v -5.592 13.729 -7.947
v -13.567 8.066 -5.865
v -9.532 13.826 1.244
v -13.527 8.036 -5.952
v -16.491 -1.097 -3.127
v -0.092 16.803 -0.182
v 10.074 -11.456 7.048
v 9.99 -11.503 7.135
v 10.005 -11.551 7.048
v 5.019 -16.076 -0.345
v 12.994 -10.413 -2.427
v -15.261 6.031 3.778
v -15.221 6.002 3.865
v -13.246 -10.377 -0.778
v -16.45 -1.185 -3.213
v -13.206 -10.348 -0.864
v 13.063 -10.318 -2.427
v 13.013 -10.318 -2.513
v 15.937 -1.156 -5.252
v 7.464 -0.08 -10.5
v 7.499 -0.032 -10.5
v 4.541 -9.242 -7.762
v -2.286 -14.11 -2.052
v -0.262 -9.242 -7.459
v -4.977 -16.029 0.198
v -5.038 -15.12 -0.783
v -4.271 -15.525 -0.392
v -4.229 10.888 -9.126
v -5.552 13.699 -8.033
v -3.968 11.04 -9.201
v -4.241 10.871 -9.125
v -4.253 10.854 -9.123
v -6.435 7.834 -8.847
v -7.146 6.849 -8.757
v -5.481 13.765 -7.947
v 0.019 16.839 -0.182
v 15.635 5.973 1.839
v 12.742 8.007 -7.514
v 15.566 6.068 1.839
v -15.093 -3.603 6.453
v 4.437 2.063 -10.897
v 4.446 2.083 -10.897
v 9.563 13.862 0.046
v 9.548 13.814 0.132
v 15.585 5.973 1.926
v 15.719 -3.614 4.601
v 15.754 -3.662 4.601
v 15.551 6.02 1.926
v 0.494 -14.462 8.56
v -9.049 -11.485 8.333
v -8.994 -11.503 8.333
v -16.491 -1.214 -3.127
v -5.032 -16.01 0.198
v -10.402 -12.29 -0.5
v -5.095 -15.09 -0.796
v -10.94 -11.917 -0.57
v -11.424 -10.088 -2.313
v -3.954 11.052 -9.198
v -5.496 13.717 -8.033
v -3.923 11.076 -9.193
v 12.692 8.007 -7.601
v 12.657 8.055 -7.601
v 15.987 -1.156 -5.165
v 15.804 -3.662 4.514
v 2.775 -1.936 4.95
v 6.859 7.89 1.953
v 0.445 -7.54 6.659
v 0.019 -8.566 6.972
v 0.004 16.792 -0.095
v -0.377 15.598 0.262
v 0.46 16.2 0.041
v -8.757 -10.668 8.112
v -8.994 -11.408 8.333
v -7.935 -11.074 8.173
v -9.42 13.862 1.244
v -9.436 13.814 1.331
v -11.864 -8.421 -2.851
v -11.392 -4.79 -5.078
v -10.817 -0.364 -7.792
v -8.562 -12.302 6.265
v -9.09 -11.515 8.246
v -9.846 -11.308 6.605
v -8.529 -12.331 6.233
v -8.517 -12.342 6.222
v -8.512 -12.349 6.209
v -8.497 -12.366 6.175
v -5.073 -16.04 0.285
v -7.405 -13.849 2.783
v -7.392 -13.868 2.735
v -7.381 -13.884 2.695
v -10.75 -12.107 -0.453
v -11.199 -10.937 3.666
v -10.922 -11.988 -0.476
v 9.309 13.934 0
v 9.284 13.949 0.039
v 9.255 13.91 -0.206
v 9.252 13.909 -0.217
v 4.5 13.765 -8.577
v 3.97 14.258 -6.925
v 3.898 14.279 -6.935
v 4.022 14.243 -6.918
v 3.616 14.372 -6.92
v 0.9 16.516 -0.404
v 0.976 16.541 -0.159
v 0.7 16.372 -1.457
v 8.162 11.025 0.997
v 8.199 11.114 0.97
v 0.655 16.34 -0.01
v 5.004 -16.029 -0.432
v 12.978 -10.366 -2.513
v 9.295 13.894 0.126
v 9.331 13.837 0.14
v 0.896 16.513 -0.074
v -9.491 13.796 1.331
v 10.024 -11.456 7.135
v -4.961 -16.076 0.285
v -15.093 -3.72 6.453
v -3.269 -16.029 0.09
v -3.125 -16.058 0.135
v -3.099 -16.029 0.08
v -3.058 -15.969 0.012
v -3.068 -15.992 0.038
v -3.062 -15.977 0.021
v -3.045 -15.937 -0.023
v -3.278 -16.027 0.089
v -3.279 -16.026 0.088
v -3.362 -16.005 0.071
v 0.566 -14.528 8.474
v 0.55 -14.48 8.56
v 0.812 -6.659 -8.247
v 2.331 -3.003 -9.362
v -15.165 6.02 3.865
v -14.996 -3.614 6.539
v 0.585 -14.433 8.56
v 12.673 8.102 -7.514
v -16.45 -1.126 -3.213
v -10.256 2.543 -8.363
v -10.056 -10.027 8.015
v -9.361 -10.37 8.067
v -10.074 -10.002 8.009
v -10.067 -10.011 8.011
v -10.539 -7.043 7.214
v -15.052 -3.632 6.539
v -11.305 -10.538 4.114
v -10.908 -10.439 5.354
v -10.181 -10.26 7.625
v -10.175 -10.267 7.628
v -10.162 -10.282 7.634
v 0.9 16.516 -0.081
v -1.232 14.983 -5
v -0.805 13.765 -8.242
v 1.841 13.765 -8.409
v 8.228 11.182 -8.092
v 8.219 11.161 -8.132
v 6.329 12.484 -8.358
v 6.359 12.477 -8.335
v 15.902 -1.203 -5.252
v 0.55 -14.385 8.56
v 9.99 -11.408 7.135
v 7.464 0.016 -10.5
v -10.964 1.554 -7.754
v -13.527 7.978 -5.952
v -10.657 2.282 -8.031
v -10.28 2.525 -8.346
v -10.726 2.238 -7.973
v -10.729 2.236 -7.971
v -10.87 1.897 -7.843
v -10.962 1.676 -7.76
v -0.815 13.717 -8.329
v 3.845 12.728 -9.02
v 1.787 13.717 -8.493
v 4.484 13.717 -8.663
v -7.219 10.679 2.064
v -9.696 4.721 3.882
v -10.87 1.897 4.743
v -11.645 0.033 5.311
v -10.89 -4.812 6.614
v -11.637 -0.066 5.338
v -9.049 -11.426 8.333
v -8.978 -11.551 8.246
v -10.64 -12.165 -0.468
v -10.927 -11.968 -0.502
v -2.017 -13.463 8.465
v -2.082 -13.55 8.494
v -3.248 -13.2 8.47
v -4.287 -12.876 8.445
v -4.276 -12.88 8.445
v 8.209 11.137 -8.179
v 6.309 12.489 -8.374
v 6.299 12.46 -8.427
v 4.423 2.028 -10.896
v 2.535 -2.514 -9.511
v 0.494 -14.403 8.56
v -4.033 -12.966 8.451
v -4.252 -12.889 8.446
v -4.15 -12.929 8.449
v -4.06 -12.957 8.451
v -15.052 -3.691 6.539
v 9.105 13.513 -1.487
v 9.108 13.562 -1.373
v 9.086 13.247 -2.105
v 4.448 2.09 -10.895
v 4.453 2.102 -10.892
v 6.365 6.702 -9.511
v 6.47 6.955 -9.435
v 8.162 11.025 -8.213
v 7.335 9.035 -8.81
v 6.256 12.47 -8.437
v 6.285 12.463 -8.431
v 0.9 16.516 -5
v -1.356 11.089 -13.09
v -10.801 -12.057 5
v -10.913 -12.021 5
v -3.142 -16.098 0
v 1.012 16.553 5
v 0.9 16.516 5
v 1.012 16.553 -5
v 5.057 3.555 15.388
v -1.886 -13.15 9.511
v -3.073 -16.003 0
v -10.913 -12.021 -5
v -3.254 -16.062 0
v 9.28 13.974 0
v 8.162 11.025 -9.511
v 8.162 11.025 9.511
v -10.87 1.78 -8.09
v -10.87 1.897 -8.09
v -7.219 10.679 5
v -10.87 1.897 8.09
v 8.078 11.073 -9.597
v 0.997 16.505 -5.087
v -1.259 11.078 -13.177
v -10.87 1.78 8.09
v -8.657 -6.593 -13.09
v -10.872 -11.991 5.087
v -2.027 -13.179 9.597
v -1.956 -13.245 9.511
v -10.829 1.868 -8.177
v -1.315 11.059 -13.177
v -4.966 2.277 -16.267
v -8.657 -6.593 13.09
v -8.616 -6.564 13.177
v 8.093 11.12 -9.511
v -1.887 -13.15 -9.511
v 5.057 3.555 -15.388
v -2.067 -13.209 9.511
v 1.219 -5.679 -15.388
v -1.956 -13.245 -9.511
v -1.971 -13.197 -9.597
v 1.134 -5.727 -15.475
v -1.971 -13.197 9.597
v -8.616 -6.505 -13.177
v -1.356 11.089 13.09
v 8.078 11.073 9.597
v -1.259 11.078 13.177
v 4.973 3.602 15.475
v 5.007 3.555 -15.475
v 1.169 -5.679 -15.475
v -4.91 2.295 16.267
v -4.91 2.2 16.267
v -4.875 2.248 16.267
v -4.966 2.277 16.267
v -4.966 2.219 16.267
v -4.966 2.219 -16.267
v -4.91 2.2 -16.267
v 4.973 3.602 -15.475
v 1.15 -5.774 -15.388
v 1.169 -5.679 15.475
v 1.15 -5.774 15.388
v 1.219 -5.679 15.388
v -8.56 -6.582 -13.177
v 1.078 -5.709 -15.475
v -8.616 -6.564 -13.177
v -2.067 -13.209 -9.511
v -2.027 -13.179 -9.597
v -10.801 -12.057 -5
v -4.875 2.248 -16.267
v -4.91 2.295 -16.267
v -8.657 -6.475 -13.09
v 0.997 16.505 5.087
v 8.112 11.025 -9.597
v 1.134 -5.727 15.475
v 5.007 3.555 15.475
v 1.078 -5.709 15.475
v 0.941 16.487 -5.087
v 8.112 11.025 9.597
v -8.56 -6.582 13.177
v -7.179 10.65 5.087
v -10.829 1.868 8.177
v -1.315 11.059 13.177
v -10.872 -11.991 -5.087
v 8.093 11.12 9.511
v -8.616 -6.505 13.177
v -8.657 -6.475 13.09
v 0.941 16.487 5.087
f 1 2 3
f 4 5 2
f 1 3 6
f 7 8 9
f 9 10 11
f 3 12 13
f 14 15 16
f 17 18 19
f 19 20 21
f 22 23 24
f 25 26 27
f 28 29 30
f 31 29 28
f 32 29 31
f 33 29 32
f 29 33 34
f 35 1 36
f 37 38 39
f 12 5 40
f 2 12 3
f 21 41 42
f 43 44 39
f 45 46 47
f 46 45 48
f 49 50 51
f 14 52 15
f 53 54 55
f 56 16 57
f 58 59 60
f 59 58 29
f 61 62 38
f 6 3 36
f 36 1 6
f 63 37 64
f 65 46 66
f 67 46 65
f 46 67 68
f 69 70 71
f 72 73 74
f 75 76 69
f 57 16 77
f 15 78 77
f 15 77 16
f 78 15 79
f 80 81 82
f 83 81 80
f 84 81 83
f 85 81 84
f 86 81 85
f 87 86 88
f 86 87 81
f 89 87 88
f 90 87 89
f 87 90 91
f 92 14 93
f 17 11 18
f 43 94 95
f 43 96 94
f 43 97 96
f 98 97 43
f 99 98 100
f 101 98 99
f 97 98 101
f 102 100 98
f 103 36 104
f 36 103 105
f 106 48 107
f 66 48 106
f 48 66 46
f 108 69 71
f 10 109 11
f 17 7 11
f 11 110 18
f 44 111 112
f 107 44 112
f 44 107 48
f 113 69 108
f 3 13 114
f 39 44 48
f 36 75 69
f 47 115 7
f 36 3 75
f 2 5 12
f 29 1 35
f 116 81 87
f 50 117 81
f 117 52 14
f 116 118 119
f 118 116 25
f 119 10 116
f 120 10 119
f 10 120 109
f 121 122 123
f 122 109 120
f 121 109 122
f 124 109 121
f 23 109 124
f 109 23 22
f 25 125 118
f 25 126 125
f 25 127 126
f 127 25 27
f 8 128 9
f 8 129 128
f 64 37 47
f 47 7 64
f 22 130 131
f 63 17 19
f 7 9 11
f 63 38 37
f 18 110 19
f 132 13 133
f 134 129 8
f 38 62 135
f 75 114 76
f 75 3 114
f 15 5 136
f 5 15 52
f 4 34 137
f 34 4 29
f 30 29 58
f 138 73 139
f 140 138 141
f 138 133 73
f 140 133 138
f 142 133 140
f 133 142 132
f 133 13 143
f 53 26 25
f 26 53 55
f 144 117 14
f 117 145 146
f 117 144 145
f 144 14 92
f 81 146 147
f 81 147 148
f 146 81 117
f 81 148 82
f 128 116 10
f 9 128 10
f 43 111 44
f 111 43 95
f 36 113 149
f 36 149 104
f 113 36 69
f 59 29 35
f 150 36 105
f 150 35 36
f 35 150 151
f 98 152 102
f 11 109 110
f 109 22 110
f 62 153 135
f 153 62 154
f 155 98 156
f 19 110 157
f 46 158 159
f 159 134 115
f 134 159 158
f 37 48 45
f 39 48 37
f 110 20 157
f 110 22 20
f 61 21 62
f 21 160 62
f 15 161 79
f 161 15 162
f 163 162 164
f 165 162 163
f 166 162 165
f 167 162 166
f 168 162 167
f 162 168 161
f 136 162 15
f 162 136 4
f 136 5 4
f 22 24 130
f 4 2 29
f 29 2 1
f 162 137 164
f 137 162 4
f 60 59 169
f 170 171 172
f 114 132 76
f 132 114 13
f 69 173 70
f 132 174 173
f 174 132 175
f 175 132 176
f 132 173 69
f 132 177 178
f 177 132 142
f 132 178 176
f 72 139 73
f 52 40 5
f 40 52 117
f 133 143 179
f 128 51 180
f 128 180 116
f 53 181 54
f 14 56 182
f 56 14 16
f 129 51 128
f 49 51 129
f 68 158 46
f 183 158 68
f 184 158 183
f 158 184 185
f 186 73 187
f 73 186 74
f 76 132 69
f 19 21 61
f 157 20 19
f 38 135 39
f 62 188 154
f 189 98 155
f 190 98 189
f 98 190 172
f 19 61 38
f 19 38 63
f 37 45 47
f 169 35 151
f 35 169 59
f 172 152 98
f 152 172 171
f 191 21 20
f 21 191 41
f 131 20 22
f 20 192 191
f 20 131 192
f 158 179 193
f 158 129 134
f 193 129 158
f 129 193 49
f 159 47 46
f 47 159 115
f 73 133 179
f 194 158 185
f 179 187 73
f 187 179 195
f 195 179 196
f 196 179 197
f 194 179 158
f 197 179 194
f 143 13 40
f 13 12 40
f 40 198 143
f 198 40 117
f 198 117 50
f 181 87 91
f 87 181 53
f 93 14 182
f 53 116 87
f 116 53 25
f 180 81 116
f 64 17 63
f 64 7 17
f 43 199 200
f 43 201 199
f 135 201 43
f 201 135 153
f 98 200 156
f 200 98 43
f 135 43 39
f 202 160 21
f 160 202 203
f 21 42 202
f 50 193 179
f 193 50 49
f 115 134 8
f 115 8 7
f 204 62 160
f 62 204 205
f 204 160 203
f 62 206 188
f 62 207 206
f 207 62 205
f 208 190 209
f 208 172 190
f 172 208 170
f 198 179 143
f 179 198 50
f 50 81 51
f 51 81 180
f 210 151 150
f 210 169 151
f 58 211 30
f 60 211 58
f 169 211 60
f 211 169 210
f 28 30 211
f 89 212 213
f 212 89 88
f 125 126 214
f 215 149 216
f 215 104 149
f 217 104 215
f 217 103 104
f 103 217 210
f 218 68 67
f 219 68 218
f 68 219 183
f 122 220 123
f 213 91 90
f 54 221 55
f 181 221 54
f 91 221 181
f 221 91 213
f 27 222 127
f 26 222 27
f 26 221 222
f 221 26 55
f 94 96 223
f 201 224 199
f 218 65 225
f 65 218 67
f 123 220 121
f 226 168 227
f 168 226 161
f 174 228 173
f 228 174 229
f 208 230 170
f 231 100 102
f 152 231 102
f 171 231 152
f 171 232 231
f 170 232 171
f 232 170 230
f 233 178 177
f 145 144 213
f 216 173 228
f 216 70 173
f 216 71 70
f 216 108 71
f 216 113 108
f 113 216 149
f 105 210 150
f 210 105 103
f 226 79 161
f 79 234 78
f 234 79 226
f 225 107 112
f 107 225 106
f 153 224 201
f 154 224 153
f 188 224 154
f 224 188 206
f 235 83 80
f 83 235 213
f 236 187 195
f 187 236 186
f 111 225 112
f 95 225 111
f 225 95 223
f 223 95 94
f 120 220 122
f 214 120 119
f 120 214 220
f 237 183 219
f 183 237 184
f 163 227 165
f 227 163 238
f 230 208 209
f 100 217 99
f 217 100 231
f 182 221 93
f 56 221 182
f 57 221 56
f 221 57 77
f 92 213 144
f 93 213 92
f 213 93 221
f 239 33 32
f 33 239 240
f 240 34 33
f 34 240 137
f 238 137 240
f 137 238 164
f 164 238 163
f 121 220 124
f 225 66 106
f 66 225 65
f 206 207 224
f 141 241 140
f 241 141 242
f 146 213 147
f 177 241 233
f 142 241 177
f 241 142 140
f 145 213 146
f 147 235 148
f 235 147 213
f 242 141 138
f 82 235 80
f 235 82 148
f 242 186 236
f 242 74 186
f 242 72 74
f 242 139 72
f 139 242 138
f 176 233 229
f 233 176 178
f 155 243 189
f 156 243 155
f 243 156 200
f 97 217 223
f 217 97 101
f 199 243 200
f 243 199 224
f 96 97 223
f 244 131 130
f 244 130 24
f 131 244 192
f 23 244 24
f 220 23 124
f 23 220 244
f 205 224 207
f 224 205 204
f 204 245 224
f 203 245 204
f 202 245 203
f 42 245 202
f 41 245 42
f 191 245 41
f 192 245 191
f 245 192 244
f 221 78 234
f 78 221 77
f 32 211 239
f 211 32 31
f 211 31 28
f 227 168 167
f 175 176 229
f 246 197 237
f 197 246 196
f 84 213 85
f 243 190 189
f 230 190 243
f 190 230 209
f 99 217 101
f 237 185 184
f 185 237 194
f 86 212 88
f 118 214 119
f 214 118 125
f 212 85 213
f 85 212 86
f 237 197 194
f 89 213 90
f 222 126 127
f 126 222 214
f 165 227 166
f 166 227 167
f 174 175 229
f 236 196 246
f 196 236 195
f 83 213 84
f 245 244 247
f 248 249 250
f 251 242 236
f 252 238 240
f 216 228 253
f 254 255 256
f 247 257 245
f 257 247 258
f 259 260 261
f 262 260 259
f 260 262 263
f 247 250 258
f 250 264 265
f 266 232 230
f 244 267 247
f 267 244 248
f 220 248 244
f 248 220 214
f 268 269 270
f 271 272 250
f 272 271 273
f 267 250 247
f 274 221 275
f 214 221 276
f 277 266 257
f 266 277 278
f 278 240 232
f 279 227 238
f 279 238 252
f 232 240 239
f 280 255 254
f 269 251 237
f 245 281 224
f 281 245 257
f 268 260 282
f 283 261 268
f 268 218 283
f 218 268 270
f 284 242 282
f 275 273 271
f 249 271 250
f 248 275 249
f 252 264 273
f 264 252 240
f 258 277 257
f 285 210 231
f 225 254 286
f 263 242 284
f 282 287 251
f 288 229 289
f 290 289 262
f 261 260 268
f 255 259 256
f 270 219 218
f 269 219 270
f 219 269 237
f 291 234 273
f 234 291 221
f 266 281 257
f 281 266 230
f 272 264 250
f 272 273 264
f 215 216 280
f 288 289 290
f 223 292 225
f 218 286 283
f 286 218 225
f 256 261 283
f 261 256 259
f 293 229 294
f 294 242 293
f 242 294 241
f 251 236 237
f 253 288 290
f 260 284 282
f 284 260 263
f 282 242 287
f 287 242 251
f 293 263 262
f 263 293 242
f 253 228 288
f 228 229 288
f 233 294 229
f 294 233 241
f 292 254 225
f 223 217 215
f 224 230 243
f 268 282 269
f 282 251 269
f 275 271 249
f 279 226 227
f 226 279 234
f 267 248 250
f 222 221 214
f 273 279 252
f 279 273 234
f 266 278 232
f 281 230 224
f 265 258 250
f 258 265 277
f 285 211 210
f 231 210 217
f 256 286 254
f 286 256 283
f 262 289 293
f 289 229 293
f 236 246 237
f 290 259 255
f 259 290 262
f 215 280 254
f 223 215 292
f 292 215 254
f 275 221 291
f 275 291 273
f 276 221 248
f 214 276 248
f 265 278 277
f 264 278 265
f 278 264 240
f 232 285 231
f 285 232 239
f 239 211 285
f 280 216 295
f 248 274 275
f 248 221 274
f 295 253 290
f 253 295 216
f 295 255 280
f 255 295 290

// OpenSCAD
// Auto-generated OpenSCAD file

    inner_points = 10*[[0.0981256772482181, 1.6457575604228036, -0.49999971188637654], [-1.0832035552174737, -1.1961778079047776, 0.5000005689987711], [-0.1274890829740991, 1.102996499198401, -1.309016652616536], [0.09812663002150081, 1.6457572632118638, 0.5000002881131254], [-1.0832045079907566, -1.1961775106938377, -0.49999943100073085], [-0.8575887949951567, -0.6534167466803746, 1.3090175097289307], [-0.4925404806041831, 0.22479035715641538, -1.618033560192892], [-0.127486588581261, 1.1029957210900594, 1.3090173361320547], [-0.8575912893879948, -0.6534159685720329, -1.3090164790196603], [-0.4925373973650727, 0.224789395361611, 1.6180344173052863], [0.8062478731875907, 1.1025170792040677, -0.951057064318678], [0.9248610728923187, 1.3878632992834963, -5.762265201658678e-07], [-0.317262991238858, -1.6003240717335458, -2.808858743374998e-07], [-0.19864979153413004, -1.314977851654117, 0.9510562072062835], [0.495716297128712, 0.3554704111460145, -1.5388422427756967], [0.8062496854700688, 1.102516513875266, 0.951055968270682], [-0.19865160381660824, -1.3149772863253153, -0.9510568253830763], [0.11188178452474858, -0.5679311835960638, 1.5388413856633023], [0.1118788521901014, -0.5679302688748477, -1.538842151510418], [0.4957192294633592, 0.3554694964247984, 1.5388412943980236], [-0.7138464220032689, 1.0620613123307217, -0.4999991117419643], [-1.3045110382361147, -0.3589063718330689, 1.0287006094733542e-06], [-0.7138454692299859, 1.062061015119782, 0.5000008882575375], [-1.0788962780137976, 0.18385468939133373, 0.8090179694307691], [-1.0788978196333527, 0.183855170288736, -0.8090160193183198]];

    outer_points = 10*[[-1.6409889130468513, -0.11555950142177197, -0.3126779904387301], [1.5886524541888336, -0.11555950142177197, -0.5165225244336256], [-1.348640822211601, 0.8007073739998204, -0.5865166414544996], [-1.3165303884764263, -1.0318263768433644, -0.07777018120554417], [1.2641939296184086, 0.8007073739998204, -0.7514303336668116], [1.2963043633535833, -1.0318263768433644, -0.24268387341785624], [-0.5511531501235996, 1.3669914457760302, -0.7946890769982492], [-0.4991973769465854, -1.5981104486195743, 0.028479987340757858], [0.4468609180885676, 1.3669914457760302, -0.8576805022131136], [0.4988166912655817, -1.5981104486195743, -0.03451143787410652], [-1.5180582313930455, 0.5972695048350894, 0.3778021724529971], [-1.5011767773548241, -0.3661505019915455, 0.6452660147863529], [1.5535132362128419, 0.5972695048350894, 0.1839345000860028], [1.5703946902510633, -0.3661505019915455, 0.4513983424193586], [-0.9450976637241996, 1.376692663078665, 0.12439394786230915], [-0.9009014432726172, -1.1455736602351207, 0.8246233778526778], [0.9532379021306351, 1.376692663078665, 0.004577137019677928], [0.9974341225822174, -1.1455736602351207, 0.7048065670100466], [-0.001146536984352193, 1.674405817908923, -0.018165330220834972], [0.05348299584236998, -1.4432868150653788, 0.8473658450931907], [-0.8699212728256985, -0.0032034345028971734, -0.9394401530094331], [0.744899410792144, -0.0032034345028971734, -1.0413624200068807], [-0.5454627482552734, -0.9194703099244896, -0.704532343776247], [0.4525513199568937, -0.9194703099244896, -0.7675237689911114], [-0.07243360073769692, 0.5630806372733126, -1.1476125885531827]];

    // Convex hull for inner set (I)
    module inner_hull() {
        hull() {
            for (p = inner_points) {
                translate(p) sphere(r=0.1);
            }
        }
    }

    // Convex hull for outer set (O) minus inner hull (O \ I)
    module outer_minus_inner() {
        difference() {
            hull() {
                for (p = outer_points) {
                    translate(p) sphere(r=0.1);
                }
            }
            inner_hull(); // Subtract inner hull
        }
    }

    // Convex hull for outer set (O) minus all translated inner hulls
    module outer_minus_AllTranslationInner() {
        difference() {
            hull() {
                for (p = outer_points) {
                    translate(p) sphere(r=0.1);
                }
            }
            hull() {
                translate([0,0,50]) inner_hull();
                translate([0,0,-50]) inner_hull();
            }; // Subtract translated inner hulls
        }
    }

    // Difference between outer_minus_inner and outer_minus_AllTranslationInner
    module outer_minus_inner_diff() {
        difference() {
            // Outer minus inner
            difference() {
                hull() {
                    for (p = outer_points) {
                        translate(p) sphere(r=0.1);
                    }
                }
                inner_hull();
            }

            // Subtract Outer minus AllTranslationInner
            difference() {
                hull() {
                    for (p = outer_points) {
                        translate(p) sphere(r=0.1);
                    }
                }
                hull() {
                    translate([0,0,50]) inner_hull();
                    translate([0,0,-50]) inner_hull();
                };
            }
        }
    }

    // Rendering all with colors applied
    color([1, 0, 0, 0.5]) inner_hull(); // Transparent red
    color([0, 1, 0, 1]) outer_minus_AllTranslationInner(); // Opaque green
    color([1, 1, 0, 1]) outer_minus_inner_diff(); // Opaque yellow
    
